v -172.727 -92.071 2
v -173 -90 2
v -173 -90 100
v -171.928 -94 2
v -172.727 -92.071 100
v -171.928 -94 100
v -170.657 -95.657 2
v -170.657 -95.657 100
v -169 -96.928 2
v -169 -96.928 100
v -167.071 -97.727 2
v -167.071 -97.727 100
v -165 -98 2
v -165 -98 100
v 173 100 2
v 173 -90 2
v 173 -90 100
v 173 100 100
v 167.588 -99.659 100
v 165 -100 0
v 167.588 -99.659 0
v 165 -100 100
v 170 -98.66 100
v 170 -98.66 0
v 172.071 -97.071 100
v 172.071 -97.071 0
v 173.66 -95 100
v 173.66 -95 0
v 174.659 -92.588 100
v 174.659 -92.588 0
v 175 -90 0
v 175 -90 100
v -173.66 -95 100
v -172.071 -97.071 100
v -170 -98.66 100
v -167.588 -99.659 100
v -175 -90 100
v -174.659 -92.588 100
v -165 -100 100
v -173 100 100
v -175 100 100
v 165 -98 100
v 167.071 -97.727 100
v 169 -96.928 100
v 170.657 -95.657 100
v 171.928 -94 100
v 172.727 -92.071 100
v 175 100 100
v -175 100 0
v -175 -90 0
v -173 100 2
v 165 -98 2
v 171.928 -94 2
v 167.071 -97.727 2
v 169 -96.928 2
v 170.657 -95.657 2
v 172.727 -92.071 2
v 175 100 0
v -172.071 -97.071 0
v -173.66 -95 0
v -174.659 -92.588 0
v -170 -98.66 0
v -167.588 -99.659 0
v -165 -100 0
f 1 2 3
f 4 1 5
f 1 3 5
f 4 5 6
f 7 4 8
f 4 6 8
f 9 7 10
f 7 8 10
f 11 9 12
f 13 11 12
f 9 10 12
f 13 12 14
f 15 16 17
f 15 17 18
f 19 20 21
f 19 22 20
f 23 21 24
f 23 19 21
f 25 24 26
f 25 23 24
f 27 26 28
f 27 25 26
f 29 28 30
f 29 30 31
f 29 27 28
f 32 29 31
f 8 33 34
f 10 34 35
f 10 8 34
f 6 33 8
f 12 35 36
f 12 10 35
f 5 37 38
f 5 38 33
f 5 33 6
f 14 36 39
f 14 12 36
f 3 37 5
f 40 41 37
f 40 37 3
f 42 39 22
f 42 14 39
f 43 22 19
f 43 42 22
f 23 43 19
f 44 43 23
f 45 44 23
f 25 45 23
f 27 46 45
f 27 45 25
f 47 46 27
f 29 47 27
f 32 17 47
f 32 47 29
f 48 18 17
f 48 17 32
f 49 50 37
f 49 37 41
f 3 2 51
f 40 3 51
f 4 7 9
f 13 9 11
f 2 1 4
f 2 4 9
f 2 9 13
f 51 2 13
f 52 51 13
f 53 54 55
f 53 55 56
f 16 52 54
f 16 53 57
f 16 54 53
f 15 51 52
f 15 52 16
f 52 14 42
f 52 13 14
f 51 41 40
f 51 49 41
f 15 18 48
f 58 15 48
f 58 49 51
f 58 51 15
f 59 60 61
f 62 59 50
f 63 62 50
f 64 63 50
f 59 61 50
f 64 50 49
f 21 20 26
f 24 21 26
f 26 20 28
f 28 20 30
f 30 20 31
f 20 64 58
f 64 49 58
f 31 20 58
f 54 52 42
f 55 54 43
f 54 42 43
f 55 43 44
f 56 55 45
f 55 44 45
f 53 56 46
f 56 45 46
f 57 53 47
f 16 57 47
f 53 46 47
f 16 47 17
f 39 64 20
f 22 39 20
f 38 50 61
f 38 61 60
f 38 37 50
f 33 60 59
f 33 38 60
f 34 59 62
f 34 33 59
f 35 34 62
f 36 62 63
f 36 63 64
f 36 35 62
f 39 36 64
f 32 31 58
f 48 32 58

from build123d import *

# Parameters (mm, degrees)
SKETCH_1_W      = 350
SKETCH_1_H      = 200
EXTRUDE_1_DEPTH = 100
FILLET_1_R      = 10
SHELL_1_T       = -2


with BuildPart() as part:
    # 草图1 → 凸台-拉伸1 (new body)
    with BuildSketch(Plane.XY):
        Rectangle(SKETCH_1_W, SKETCH_1_H)
    extrude(amount=EXTRUDE_1_DEPTH)

    # 圆角1
    fillet_1_edges = [part.edges().sort_by_distance(p)[0] for p in [
        (175, -100, 50),
        (-175, -100, 50),
    ]]
    fillet(fillet_1_edges, radius=FILLET_1_R)

    # 抽壳1
    shell_1_openings = [part.faces().sort_by_distance(p)[0] for p in [
        (0, 0.059982012, 100),
        (0, 100, 50),
    ]]
    offset(amount=SHELL_1_T, openings=shell_1_openings, kind=Kind.INTERSECTION)


solid = part.part
